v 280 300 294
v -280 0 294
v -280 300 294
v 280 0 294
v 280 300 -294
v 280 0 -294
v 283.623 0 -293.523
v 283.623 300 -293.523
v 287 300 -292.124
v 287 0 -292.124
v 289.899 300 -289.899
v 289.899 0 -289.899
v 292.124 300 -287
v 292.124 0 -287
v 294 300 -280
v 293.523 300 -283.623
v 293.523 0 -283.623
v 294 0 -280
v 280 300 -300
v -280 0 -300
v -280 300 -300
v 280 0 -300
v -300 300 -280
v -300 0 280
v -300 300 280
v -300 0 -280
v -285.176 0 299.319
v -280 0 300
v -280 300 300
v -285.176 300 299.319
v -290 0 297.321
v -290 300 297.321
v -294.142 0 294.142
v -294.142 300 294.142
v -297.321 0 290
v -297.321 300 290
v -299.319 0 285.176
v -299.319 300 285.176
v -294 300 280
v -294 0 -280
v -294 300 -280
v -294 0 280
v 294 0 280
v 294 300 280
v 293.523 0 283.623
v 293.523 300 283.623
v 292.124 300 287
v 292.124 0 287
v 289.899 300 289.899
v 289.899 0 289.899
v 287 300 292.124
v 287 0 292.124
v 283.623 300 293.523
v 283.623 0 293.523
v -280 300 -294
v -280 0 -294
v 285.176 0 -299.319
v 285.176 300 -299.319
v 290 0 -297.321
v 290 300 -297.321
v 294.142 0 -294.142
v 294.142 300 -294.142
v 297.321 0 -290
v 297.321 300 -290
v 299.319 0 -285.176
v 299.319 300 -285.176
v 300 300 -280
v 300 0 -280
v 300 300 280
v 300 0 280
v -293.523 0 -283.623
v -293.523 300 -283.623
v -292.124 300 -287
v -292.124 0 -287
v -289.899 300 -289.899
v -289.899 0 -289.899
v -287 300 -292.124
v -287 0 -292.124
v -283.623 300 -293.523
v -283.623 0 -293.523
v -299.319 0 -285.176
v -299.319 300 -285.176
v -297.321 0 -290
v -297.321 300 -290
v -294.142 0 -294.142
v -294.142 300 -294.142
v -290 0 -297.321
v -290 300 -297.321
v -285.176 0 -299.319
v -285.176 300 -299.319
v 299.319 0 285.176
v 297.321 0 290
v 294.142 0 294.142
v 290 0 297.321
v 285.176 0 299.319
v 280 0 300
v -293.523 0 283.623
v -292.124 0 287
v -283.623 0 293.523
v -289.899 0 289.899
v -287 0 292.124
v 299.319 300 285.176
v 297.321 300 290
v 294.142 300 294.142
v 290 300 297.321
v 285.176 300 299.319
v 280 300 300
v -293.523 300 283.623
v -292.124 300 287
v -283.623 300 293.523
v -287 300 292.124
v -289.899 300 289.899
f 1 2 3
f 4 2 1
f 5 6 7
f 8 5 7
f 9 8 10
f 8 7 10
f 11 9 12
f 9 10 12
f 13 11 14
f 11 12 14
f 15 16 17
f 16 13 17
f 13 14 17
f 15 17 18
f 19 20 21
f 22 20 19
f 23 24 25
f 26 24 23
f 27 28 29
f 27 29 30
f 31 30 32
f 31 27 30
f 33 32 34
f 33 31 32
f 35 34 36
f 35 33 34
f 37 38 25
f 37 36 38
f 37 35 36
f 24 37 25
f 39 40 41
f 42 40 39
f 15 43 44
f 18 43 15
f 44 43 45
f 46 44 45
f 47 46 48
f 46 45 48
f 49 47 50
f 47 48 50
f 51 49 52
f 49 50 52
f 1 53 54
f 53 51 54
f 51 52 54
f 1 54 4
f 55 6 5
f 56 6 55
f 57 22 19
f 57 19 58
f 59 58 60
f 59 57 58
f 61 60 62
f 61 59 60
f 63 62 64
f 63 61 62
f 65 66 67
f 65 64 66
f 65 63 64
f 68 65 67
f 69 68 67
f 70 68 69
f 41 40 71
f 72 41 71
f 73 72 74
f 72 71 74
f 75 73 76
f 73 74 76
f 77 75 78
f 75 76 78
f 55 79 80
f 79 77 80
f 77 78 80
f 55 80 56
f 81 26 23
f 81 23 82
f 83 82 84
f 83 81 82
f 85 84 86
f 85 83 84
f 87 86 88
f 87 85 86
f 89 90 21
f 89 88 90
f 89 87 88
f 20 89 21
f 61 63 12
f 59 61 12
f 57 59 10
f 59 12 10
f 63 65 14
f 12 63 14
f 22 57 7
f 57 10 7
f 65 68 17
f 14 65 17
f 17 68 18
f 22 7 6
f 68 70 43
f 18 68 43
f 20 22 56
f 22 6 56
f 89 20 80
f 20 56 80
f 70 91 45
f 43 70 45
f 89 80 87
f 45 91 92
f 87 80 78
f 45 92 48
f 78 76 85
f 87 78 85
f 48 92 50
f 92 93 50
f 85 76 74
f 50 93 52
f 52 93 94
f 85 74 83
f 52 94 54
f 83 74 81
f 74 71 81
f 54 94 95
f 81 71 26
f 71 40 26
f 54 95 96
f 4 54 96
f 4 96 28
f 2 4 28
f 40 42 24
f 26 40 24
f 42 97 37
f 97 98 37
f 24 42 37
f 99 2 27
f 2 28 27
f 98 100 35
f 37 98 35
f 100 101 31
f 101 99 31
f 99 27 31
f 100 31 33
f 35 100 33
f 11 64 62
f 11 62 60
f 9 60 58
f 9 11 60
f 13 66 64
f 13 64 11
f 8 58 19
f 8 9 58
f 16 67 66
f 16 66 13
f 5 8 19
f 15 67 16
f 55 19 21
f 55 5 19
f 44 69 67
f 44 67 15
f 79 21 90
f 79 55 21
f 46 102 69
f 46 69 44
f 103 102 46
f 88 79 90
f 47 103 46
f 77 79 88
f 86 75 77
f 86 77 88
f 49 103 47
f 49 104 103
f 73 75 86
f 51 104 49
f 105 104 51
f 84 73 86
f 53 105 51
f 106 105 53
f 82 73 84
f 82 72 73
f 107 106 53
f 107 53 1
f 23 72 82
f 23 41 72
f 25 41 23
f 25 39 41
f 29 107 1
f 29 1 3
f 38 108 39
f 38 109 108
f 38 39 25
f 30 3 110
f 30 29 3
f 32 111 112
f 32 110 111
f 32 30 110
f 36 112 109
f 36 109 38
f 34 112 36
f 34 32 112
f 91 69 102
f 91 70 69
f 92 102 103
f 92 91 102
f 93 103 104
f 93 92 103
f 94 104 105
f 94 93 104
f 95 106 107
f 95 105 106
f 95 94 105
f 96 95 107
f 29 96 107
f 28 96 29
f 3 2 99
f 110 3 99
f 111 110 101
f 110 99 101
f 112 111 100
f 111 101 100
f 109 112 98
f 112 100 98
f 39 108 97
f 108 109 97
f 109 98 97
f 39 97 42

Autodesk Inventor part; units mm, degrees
ref_plane "YZ Plane" through (0, 0, 0) normal (1, 0, 0) x (0, 1, 0)
ref_plane "XZ Plane" through (0, 0, 0) normal (0, 1, 0) x (-1, 0, 0)
ref_plane "XY Plane" through (0, 0, 0) normal (0, 0, 1) x (1, 0, 0)
sketch "Sketch1" plane through (0, 0, 0) normal (0, 1, 0) x (-1, 0, 0)
  line L0 (-280, 300) -> (280, 300)
  line L1 (300, 280) -> (300, -280)
  line L2 (280, -300) -> (-280, -300)
  line L3 (-300, -280) -> (-300, 280)
  line L4 (-300, 300) -> (300, -300) construction
  line L5 (300, 300) -> (-300, -300) construction
  arc A0 (300, 280) -> (280, 300) centre (280, 280) ccw
  arc A1 (280, -300) -> (300, -280) centre (280, -280) ccw
  arc A2 (-300, -280) -> (-280, -300) centre (-280, -280) ccw
  arc A3 (-280, 300) -> (-300, 280) centre (-280, 280) ccw
  line L6 (280, 294) -> (-280, 294)
  arc A4 (-280, 294) -> (-294, 280) centre (-280, 280) ccw
  line L7 (-294, 280) -> (-294, -280)
  arc A5 (-294, -280) -> (-280, -294) centre (-280, -280) ccw
  line L8 (-280, -294) -> (280, -294)
  arc A6 (280, -294) -> (294, -280) centre (280, -280) ccw
  line L9 (294, -280) -> (294, 280)
  arc A7 (294, 280) -> (280, 294) centre (280, 280) ccw
  point P0 (0, 0)
  dimension "d0" = 600
  dimension "d1" = 600
  dimension "d2" = 20
  dimension "d3" = 6
extrude "Extrusion1" add sketch "Sketch1" along normal blind 300
properties part number "Stackbox-noHoles"
